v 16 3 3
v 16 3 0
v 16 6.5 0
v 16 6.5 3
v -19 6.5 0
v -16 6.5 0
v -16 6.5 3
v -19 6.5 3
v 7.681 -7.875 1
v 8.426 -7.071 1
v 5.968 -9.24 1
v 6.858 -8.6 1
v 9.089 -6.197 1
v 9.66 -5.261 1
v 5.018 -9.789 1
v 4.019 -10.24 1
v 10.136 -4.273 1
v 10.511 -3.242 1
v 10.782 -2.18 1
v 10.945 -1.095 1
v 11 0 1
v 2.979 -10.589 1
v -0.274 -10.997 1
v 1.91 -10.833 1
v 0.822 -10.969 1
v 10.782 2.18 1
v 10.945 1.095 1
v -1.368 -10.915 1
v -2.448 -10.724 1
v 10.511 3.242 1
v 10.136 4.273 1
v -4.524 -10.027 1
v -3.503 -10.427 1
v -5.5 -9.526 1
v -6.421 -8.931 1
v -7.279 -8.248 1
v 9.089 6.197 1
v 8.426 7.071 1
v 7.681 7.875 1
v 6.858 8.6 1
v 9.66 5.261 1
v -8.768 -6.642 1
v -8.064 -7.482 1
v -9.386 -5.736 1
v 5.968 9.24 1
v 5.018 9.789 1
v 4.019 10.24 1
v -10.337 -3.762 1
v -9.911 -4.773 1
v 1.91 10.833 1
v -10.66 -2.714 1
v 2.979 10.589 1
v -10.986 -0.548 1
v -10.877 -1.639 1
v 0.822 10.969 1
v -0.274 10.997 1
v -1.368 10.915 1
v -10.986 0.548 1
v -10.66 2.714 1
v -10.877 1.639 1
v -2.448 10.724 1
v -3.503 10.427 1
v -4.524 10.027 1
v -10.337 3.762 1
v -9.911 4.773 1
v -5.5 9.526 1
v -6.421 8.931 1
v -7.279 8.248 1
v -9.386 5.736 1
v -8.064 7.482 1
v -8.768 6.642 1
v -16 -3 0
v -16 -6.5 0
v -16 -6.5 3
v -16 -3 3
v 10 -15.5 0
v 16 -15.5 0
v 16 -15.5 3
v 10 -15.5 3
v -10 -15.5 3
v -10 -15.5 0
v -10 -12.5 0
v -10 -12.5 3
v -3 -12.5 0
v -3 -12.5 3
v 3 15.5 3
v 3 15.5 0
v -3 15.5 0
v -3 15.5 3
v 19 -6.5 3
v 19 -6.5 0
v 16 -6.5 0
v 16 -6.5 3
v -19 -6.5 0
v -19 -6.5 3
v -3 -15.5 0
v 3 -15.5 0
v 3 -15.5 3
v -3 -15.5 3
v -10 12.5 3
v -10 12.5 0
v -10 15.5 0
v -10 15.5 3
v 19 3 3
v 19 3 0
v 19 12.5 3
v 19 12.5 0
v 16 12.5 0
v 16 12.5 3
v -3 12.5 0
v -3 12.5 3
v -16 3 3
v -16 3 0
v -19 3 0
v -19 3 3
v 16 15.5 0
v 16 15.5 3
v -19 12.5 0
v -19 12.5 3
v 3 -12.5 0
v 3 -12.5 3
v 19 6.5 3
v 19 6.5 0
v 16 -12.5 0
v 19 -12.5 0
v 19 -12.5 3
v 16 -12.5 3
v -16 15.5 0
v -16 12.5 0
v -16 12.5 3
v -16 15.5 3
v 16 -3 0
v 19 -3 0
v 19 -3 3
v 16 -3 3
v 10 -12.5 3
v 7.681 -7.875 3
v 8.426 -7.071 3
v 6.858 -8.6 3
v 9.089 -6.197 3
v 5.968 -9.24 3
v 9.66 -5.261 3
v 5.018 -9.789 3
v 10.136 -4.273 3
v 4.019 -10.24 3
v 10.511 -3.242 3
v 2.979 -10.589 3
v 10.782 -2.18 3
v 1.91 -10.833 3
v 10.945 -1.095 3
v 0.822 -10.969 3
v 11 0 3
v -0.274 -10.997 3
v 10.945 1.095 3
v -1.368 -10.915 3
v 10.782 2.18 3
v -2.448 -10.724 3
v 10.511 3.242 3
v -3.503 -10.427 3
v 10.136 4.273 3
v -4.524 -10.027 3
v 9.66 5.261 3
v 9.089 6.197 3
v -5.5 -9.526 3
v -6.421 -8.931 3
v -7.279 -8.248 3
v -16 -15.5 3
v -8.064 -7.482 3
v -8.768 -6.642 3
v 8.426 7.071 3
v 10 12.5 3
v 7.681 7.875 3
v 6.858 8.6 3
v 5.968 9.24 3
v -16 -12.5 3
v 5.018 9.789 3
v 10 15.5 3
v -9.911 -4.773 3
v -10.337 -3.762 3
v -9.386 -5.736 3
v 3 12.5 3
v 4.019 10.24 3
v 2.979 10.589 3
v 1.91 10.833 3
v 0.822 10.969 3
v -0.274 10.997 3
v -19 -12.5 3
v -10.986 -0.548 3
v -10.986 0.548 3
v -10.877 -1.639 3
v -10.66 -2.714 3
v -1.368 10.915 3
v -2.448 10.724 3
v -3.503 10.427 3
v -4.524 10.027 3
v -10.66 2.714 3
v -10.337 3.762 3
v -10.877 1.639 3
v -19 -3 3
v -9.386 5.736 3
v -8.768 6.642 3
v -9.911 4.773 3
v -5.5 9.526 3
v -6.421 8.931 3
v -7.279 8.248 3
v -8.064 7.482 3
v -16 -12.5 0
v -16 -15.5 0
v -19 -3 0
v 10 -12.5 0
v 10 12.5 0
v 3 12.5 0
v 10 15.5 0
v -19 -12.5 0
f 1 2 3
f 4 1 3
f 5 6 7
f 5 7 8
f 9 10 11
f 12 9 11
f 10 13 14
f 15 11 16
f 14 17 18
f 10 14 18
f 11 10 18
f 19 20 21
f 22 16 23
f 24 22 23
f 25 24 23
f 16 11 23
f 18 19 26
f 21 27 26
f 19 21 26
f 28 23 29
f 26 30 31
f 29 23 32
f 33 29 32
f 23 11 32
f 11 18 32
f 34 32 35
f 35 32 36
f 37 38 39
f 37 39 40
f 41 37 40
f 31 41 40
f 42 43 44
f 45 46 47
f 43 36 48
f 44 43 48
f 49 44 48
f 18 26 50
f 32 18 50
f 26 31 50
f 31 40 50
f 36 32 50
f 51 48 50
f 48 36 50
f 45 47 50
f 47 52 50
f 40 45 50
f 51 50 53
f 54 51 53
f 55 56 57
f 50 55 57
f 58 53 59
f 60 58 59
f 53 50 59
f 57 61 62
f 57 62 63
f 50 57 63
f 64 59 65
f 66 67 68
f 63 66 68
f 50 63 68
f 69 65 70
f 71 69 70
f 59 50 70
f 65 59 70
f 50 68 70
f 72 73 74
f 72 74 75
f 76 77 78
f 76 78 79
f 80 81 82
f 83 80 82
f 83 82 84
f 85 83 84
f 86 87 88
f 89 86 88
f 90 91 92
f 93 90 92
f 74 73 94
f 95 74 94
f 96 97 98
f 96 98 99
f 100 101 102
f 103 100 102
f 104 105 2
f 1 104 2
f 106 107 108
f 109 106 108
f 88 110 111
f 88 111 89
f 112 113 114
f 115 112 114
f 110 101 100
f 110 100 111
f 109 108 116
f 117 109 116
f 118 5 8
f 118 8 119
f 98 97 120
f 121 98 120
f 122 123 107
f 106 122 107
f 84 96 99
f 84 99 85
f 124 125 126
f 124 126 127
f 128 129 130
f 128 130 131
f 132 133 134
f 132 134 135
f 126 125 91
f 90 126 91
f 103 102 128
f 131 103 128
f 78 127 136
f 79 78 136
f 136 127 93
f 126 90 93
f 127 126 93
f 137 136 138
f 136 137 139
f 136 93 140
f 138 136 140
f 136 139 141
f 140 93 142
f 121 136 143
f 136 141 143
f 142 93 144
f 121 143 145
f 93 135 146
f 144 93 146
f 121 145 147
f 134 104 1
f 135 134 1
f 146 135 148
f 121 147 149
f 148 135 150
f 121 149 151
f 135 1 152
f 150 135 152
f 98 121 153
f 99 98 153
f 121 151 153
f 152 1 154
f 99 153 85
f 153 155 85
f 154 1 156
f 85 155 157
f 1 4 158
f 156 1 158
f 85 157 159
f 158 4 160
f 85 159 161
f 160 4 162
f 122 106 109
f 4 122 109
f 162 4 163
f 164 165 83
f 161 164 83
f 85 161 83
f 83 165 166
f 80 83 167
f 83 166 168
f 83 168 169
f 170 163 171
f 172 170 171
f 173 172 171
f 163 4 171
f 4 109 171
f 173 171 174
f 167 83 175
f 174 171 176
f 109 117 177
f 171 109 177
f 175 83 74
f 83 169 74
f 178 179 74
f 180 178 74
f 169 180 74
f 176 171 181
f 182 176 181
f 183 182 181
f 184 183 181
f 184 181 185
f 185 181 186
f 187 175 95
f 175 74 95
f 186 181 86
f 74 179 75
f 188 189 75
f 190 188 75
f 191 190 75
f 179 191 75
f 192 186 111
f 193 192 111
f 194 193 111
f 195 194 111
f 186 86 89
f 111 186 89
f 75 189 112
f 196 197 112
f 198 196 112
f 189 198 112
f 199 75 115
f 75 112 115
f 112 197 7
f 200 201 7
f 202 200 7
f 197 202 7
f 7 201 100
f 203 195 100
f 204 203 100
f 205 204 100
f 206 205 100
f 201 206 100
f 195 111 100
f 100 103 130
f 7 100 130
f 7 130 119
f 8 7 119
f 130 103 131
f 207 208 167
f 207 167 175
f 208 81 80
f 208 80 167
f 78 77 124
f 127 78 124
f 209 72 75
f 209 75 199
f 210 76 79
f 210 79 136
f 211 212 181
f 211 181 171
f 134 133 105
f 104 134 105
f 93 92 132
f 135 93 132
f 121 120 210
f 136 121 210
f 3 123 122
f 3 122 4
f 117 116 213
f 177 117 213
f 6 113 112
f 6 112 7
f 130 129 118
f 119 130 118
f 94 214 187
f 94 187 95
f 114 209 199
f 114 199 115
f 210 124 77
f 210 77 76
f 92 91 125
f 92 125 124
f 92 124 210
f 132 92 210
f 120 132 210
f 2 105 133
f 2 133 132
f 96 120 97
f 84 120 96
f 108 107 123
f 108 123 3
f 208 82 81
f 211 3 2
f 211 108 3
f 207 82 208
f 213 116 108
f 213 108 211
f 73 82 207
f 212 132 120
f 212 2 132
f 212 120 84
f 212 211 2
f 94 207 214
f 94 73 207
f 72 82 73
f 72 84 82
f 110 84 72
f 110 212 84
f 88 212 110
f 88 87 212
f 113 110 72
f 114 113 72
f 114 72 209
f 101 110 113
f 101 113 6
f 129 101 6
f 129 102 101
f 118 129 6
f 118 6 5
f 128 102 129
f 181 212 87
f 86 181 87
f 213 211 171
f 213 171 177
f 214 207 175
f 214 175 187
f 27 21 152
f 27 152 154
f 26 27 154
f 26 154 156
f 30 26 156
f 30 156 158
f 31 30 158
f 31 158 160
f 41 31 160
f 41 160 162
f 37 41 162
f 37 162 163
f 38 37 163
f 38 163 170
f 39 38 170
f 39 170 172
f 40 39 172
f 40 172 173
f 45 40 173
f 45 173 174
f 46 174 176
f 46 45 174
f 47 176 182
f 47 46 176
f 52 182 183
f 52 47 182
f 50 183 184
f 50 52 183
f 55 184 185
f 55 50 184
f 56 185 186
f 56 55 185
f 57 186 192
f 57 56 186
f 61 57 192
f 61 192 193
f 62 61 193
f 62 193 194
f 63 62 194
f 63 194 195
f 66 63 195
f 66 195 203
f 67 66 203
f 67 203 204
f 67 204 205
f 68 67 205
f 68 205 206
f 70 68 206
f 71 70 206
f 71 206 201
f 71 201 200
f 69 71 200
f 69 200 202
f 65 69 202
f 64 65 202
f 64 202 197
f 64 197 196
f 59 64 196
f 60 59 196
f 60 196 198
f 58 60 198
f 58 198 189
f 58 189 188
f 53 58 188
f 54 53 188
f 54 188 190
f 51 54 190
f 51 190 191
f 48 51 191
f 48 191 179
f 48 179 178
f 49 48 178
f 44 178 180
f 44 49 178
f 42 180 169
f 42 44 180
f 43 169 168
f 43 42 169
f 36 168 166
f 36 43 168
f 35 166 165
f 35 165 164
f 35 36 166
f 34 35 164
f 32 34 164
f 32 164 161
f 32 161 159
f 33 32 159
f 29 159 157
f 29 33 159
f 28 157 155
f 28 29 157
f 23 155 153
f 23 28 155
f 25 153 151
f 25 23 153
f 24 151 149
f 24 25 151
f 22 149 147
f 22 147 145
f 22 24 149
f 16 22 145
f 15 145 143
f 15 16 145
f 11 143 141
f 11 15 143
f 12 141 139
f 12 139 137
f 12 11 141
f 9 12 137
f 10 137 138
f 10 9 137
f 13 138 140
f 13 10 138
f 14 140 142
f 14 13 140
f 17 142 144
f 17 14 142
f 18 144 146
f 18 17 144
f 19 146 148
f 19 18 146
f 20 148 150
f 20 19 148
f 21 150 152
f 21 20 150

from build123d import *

# Parameters (mm, degrees)
SKETCH2_W           = 32
SKETCH2_H           = 25
SKETCH2_R           = 11
BOSS_EXTRUDE1_DEPTH = 3
SKETCH3_R           = 11
BOSS_EXTRUDE2_DEPTH = 1
SKETCH4_W           = 6
SKETCH4_H           = 3
SKETCH4_W_2         = 3
SKETCH4_H_2         = 6
BOSS_EXTRUDE3_DEPTH = 3


with BuildPart() as part:
    # Sketch2 → Boss-Extrude1 (new body)
    with BuildSketch(Plane.XY):
        Rectangle(SKETCH2_W, SKETCH2_H)
        Circle(SKETCH2_R, mode=Mode.SUBTRACT)
    extrude(amount=BOSS_EXTRUDE1_DEPTH)

    # Sketch3 → Boss-Extrude2 (add)
    with BuildSketch(Plane(origin=(0, 0, 0), x_dir=(-1, 0, 0), z_dir=(0, 0, -1))):
        Circle(SKETCH3_R)
    extrude(amount=-BOSS_EXTRUDE2_DEPTH)

    # Sketch4 → Boss-Extrude3 (add)
    with BuildSketch(Plane(origin=(0, 0, 0), x_dir=(-1, 0, 0), z_dir=(0, 0, -1))):
        with Locations((-13, -14)):
            Rectangle(SKETCH4_W, SKETCH4_H)
        with Locations((-17.5, -9.5)):
            Rectangle(SKETCH4_W_2, SKETCH4_H_2)
        with Locations((-17.5, 0)):
            Rectangle(SKETCH4_W_2, SKETCH4_H_2)
        with Locations((-17.5, 9.5)):
            Rectangle(SKETCH4_W_2, SKETCH4_H_2)
        with Locations((0, 14)):
            Rectangle(SKETCH4_W, SKETCH4_H)
        with Locations((13, 14)):
            Rectangle(SKETCH4_W, SKETCH4_H)
        with Locations((17.5, 9.5)):
            Rectangle(SKETCH4_W_2, SKETCH4_H_2)
        with Locations((17.5, 0)):
            Rectangle(SKETCH4_W_2, SKETCH4_H_2)
        with Locations((17.5, -9.5)):
            Rectangle(SKETCH4_W_2, SKETCH4_H_2)
        with Locations((13, -14)):
            Rectangle(SKETCH4_W, SKETCH4_H)
        with Locations((0, -14)):
            Rectangle(SKETCH4_W, SKETCH4_H)
        with Locations((-13, 14)):
            Rectangle(SKETCH4_W, SKETCH4_H)
    extrude(amount=-BOSS_EXTRUDE3_DEPTH)


solid = part.part
